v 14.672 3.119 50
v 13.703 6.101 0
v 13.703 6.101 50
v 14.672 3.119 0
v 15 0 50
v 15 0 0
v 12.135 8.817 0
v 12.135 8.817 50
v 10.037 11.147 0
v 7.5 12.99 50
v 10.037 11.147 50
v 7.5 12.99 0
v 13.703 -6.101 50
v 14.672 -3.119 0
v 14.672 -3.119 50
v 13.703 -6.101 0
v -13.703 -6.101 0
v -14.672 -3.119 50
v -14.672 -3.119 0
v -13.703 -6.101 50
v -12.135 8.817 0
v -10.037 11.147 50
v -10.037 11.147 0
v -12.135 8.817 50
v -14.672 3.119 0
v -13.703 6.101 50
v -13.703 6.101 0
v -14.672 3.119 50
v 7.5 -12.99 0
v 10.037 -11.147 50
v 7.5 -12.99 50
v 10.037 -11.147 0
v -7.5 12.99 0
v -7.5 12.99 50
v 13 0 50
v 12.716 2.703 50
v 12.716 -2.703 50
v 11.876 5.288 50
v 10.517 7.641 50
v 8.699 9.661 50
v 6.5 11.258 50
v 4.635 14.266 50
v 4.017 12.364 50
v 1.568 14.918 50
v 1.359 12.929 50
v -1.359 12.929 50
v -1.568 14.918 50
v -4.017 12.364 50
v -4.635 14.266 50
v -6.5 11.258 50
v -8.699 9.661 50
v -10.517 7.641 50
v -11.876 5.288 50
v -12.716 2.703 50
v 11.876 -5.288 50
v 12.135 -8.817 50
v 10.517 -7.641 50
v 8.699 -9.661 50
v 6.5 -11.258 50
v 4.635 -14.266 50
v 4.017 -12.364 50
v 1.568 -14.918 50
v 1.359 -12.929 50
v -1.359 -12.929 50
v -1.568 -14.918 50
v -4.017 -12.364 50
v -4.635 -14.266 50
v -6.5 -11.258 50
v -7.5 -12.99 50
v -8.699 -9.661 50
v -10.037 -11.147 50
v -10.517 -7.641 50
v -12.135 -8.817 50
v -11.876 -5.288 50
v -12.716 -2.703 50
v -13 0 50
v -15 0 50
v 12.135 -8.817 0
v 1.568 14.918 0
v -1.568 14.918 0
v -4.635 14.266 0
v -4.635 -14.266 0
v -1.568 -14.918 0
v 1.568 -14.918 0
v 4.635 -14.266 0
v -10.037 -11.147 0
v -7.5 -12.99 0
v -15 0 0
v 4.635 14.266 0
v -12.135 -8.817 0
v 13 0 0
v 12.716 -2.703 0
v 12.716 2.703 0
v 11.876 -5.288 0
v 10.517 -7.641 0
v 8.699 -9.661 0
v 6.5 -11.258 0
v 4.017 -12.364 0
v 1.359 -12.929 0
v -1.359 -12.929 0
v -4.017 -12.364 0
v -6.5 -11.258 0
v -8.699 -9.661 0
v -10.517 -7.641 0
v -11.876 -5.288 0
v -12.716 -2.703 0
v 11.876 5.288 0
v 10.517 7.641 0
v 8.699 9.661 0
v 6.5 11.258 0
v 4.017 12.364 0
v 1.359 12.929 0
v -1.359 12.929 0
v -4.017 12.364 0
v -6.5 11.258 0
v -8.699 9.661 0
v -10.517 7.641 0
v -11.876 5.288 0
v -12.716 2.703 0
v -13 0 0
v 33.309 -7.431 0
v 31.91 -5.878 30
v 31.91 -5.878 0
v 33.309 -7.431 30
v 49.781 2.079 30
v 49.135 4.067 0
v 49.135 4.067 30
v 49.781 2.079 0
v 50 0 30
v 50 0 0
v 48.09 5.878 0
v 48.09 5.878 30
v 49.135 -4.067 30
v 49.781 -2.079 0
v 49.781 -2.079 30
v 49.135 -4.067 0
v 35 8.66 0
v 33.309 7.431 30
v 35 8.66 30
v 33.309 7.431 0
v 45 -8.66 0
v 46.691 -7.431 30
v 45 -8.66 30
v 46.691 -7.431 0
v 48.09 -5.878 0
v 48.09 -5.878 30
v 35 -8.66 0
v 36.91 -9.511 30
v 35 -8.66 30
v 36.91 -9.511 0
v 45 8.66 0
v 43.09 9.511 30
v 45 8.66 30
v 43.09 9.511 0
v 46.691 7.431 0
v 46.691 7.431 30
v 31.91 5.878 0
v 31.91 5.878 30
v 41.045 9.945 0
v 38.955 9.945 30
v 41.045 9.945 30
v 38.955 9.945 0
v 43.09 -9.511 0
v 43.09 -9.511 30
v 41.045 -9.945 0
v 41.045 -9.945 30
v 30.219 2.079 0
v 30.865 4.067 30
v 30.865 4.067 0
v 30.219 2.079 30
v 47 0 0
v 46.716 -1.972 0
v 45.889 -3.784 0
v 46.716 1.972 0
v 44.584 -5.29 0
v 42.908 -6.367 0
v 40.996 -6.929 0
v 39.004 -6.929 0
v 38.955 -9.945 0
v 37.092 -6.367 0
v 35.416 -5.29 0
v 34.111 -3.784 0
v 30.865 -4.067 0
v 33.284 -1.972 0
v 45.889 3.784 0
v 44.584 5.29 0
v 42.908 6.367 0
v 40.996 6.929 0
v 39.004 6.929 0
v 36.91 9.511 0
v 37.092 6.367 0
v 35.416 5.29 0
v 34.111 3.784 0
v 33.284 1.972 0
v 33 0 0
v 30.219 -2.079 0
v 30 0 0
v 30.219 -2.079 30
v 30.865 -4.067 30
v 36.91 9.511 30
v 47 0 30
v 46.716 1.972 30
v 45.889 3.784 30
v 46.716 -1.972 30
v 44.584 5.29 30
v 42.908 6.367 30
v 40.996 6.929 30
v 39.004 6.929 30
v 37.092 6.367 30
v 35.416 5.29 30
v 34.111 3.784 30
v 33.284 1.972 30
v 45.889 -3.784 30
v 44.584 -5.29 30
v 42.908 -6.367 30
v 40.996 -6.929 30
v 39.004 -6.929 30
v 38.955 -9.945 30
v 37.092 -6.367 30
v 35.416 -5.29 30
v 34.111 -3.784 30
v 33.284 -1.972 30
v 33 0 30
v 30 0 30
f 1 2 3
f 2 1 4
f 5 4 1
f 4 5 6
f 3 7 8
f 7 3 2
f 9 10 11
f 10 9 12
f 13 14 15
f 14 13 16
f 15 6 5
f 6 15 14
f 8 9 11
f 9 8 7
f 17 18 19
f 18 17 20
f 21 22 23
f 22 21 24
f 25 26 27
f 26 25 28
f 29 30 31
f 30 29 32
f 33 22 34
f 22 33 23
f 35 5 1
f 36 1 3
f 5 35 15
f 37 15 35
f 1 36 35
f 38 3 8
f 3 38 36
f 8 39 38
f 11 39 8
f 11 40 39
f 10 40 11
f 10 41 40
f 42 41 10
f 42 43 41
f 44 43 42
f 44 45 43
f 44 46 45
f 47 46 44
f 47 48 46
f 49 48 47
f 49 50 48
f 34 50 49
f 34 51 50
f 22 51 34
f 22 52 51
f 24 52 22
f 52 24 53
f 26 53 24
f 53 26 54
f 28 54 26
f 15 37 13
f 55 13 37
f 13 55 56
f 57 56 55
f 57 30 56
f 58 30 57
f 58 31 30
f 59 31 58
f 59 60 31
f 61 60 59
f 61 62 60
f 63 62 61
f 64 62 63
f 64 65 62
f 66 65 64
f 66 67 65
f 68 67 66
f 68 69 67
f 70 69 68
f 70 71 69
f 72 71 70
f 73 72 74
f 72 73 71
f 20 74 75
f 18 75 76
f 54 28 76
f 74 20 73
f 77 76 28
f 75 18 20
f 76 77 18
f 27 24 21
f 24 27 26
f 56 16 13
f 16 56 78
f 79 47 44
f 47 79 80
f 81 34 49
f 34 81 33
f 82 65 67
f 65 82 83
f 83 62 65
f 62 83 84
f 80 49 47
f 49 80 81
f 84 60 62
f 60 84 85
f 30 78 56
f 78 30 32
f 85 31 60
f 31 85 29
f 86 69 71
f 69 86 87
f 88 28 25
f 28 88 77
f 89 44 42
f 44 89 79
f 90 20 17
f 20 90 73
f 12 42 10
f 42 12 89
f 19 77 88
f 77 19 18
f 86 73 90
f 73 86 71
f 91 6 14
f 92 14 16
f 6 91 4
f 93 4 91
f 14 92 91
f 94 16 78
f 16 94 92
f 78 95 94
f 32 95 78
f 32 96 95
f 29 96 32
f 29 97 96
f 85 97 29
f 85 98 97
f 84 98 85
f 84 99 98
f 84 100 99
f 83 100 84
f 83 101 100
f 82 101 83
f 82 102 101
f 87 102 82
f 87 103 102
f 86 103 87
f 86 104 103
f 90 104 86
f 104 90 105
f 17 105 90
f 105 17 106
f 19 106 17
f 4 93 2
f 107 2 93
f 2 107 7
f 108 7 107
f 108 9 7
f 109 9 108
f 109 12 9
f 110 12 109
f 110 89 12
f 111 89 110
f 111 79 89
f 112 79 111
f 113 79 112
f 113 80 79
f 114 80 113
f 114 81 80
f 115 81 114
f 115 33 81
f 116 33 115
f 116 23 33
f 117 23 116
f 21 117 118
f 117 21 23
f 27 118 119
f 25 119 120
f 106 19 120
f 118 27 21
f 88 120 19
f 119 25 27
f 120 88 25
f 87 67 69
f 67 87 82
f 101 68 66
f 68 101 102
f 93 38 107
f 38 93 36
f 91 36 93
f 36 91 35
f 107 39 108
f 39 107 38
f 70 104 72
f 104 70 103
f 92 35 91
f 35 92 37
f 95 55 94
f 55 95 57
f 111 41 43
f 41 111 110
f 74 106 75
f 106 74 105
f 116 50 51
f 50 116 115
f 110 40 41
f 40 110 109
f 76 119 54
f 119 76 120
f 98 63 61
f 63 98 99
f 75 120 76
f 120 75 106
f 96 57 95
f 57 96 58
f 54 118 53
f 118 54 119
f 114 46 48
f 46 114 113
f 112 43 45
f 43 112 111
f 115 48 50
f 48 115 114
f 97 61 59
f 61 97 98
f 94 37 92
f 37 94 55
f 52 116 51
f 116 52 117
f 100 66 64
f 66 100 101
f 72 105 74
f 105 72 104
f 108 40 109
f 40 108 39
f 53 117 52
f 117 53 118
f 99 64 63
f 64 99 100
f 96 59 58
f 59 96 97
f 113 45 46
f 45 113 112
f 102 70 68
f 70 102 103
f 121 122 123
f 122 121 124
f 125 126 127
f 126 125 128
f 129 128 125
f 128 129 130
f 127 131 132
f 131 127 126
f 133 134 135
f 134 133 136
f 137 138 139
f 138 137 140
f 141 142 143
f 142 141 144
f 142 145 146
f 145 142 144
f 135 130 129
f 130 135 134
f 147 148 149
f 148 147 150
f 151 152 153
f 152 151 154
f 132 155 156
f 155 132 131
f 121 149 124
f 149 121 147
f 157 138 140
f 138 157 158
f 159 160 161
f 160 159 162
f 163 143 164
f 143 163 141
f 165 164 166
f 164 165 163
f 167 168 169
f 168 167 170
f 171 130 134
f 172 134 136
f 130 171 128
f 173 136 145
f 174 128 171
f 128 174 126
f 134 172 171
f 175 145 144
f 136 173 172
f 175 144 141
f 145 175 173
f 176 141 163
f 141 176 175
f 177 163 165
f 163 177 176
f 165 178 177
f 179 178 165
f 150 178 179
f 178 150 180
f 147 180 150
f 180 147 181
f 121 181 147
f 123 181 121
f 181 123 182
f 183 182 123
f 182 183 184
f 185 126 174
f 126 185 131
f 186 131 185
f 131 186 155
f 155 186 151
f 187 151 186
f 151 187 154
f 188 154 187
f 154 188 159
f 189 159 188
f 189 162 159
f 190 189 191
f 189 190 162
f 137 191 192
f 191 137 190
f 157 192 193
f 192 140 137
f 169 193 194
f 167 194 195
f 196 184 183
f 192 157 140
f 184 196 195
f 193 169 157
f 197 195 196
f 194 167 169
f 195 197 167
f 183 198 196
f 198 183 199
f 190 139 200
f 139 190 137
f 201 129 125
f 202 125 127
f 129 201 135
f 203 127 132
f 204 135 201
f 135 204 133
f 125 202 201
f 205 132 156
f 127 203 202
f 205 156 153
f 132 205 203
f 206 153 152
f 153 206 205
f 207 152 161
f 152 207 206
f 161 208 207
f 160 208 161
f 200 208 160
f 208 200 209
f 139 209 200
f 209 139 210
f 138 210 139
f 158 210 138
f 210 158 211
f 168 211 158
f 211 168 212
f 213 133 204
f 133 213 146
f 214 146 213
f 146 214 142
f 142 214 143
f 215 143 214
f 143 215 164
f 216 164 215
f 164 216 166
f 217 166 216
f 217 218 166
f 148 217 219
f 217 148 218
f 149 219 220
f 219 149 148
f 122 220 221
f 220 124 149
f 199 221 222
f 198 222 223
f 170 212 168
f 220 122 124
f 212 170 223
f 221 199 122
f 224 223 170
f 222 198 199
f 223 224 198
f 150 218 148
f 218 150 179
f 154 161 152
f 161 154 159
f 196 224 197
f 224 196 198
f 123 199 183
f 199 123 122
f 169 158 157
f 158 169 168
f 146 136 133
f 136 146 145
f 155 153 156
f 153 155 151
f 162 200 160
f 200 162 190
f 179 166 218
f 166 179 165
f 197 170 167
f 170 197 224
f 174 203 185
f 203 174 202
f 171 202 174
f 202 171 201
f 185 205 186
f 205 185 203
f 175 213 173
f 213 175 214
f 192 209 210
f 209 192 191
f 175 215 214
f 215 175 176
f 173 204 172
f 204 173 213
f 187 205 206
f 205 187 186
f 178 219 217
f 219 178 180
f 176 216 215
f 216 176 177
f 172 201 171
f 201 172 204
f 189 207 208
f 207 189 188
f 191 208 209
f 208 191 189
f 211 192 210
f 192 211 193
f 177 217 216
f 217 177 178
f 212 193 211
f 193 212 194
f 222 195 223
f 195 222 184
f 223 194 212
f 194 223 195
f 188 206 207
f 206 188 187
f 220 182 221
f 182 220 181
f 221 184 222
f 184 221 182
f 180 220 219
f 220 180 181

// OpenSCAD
module cilindro_hueco(diametro, altura, grosor) {
    difference() {
        cylinder(h=altura, d=diametro);
        translate([0, 0, -1]) 
            cylinder(h=altura+2, d=diametro - 2*grosor);
    }
}

// Usar el módulo varias veces
cilindro_hueco(30, 50, 2);
translate([40, 0, 0]) cilindro_hueco(20, 30, 3);
